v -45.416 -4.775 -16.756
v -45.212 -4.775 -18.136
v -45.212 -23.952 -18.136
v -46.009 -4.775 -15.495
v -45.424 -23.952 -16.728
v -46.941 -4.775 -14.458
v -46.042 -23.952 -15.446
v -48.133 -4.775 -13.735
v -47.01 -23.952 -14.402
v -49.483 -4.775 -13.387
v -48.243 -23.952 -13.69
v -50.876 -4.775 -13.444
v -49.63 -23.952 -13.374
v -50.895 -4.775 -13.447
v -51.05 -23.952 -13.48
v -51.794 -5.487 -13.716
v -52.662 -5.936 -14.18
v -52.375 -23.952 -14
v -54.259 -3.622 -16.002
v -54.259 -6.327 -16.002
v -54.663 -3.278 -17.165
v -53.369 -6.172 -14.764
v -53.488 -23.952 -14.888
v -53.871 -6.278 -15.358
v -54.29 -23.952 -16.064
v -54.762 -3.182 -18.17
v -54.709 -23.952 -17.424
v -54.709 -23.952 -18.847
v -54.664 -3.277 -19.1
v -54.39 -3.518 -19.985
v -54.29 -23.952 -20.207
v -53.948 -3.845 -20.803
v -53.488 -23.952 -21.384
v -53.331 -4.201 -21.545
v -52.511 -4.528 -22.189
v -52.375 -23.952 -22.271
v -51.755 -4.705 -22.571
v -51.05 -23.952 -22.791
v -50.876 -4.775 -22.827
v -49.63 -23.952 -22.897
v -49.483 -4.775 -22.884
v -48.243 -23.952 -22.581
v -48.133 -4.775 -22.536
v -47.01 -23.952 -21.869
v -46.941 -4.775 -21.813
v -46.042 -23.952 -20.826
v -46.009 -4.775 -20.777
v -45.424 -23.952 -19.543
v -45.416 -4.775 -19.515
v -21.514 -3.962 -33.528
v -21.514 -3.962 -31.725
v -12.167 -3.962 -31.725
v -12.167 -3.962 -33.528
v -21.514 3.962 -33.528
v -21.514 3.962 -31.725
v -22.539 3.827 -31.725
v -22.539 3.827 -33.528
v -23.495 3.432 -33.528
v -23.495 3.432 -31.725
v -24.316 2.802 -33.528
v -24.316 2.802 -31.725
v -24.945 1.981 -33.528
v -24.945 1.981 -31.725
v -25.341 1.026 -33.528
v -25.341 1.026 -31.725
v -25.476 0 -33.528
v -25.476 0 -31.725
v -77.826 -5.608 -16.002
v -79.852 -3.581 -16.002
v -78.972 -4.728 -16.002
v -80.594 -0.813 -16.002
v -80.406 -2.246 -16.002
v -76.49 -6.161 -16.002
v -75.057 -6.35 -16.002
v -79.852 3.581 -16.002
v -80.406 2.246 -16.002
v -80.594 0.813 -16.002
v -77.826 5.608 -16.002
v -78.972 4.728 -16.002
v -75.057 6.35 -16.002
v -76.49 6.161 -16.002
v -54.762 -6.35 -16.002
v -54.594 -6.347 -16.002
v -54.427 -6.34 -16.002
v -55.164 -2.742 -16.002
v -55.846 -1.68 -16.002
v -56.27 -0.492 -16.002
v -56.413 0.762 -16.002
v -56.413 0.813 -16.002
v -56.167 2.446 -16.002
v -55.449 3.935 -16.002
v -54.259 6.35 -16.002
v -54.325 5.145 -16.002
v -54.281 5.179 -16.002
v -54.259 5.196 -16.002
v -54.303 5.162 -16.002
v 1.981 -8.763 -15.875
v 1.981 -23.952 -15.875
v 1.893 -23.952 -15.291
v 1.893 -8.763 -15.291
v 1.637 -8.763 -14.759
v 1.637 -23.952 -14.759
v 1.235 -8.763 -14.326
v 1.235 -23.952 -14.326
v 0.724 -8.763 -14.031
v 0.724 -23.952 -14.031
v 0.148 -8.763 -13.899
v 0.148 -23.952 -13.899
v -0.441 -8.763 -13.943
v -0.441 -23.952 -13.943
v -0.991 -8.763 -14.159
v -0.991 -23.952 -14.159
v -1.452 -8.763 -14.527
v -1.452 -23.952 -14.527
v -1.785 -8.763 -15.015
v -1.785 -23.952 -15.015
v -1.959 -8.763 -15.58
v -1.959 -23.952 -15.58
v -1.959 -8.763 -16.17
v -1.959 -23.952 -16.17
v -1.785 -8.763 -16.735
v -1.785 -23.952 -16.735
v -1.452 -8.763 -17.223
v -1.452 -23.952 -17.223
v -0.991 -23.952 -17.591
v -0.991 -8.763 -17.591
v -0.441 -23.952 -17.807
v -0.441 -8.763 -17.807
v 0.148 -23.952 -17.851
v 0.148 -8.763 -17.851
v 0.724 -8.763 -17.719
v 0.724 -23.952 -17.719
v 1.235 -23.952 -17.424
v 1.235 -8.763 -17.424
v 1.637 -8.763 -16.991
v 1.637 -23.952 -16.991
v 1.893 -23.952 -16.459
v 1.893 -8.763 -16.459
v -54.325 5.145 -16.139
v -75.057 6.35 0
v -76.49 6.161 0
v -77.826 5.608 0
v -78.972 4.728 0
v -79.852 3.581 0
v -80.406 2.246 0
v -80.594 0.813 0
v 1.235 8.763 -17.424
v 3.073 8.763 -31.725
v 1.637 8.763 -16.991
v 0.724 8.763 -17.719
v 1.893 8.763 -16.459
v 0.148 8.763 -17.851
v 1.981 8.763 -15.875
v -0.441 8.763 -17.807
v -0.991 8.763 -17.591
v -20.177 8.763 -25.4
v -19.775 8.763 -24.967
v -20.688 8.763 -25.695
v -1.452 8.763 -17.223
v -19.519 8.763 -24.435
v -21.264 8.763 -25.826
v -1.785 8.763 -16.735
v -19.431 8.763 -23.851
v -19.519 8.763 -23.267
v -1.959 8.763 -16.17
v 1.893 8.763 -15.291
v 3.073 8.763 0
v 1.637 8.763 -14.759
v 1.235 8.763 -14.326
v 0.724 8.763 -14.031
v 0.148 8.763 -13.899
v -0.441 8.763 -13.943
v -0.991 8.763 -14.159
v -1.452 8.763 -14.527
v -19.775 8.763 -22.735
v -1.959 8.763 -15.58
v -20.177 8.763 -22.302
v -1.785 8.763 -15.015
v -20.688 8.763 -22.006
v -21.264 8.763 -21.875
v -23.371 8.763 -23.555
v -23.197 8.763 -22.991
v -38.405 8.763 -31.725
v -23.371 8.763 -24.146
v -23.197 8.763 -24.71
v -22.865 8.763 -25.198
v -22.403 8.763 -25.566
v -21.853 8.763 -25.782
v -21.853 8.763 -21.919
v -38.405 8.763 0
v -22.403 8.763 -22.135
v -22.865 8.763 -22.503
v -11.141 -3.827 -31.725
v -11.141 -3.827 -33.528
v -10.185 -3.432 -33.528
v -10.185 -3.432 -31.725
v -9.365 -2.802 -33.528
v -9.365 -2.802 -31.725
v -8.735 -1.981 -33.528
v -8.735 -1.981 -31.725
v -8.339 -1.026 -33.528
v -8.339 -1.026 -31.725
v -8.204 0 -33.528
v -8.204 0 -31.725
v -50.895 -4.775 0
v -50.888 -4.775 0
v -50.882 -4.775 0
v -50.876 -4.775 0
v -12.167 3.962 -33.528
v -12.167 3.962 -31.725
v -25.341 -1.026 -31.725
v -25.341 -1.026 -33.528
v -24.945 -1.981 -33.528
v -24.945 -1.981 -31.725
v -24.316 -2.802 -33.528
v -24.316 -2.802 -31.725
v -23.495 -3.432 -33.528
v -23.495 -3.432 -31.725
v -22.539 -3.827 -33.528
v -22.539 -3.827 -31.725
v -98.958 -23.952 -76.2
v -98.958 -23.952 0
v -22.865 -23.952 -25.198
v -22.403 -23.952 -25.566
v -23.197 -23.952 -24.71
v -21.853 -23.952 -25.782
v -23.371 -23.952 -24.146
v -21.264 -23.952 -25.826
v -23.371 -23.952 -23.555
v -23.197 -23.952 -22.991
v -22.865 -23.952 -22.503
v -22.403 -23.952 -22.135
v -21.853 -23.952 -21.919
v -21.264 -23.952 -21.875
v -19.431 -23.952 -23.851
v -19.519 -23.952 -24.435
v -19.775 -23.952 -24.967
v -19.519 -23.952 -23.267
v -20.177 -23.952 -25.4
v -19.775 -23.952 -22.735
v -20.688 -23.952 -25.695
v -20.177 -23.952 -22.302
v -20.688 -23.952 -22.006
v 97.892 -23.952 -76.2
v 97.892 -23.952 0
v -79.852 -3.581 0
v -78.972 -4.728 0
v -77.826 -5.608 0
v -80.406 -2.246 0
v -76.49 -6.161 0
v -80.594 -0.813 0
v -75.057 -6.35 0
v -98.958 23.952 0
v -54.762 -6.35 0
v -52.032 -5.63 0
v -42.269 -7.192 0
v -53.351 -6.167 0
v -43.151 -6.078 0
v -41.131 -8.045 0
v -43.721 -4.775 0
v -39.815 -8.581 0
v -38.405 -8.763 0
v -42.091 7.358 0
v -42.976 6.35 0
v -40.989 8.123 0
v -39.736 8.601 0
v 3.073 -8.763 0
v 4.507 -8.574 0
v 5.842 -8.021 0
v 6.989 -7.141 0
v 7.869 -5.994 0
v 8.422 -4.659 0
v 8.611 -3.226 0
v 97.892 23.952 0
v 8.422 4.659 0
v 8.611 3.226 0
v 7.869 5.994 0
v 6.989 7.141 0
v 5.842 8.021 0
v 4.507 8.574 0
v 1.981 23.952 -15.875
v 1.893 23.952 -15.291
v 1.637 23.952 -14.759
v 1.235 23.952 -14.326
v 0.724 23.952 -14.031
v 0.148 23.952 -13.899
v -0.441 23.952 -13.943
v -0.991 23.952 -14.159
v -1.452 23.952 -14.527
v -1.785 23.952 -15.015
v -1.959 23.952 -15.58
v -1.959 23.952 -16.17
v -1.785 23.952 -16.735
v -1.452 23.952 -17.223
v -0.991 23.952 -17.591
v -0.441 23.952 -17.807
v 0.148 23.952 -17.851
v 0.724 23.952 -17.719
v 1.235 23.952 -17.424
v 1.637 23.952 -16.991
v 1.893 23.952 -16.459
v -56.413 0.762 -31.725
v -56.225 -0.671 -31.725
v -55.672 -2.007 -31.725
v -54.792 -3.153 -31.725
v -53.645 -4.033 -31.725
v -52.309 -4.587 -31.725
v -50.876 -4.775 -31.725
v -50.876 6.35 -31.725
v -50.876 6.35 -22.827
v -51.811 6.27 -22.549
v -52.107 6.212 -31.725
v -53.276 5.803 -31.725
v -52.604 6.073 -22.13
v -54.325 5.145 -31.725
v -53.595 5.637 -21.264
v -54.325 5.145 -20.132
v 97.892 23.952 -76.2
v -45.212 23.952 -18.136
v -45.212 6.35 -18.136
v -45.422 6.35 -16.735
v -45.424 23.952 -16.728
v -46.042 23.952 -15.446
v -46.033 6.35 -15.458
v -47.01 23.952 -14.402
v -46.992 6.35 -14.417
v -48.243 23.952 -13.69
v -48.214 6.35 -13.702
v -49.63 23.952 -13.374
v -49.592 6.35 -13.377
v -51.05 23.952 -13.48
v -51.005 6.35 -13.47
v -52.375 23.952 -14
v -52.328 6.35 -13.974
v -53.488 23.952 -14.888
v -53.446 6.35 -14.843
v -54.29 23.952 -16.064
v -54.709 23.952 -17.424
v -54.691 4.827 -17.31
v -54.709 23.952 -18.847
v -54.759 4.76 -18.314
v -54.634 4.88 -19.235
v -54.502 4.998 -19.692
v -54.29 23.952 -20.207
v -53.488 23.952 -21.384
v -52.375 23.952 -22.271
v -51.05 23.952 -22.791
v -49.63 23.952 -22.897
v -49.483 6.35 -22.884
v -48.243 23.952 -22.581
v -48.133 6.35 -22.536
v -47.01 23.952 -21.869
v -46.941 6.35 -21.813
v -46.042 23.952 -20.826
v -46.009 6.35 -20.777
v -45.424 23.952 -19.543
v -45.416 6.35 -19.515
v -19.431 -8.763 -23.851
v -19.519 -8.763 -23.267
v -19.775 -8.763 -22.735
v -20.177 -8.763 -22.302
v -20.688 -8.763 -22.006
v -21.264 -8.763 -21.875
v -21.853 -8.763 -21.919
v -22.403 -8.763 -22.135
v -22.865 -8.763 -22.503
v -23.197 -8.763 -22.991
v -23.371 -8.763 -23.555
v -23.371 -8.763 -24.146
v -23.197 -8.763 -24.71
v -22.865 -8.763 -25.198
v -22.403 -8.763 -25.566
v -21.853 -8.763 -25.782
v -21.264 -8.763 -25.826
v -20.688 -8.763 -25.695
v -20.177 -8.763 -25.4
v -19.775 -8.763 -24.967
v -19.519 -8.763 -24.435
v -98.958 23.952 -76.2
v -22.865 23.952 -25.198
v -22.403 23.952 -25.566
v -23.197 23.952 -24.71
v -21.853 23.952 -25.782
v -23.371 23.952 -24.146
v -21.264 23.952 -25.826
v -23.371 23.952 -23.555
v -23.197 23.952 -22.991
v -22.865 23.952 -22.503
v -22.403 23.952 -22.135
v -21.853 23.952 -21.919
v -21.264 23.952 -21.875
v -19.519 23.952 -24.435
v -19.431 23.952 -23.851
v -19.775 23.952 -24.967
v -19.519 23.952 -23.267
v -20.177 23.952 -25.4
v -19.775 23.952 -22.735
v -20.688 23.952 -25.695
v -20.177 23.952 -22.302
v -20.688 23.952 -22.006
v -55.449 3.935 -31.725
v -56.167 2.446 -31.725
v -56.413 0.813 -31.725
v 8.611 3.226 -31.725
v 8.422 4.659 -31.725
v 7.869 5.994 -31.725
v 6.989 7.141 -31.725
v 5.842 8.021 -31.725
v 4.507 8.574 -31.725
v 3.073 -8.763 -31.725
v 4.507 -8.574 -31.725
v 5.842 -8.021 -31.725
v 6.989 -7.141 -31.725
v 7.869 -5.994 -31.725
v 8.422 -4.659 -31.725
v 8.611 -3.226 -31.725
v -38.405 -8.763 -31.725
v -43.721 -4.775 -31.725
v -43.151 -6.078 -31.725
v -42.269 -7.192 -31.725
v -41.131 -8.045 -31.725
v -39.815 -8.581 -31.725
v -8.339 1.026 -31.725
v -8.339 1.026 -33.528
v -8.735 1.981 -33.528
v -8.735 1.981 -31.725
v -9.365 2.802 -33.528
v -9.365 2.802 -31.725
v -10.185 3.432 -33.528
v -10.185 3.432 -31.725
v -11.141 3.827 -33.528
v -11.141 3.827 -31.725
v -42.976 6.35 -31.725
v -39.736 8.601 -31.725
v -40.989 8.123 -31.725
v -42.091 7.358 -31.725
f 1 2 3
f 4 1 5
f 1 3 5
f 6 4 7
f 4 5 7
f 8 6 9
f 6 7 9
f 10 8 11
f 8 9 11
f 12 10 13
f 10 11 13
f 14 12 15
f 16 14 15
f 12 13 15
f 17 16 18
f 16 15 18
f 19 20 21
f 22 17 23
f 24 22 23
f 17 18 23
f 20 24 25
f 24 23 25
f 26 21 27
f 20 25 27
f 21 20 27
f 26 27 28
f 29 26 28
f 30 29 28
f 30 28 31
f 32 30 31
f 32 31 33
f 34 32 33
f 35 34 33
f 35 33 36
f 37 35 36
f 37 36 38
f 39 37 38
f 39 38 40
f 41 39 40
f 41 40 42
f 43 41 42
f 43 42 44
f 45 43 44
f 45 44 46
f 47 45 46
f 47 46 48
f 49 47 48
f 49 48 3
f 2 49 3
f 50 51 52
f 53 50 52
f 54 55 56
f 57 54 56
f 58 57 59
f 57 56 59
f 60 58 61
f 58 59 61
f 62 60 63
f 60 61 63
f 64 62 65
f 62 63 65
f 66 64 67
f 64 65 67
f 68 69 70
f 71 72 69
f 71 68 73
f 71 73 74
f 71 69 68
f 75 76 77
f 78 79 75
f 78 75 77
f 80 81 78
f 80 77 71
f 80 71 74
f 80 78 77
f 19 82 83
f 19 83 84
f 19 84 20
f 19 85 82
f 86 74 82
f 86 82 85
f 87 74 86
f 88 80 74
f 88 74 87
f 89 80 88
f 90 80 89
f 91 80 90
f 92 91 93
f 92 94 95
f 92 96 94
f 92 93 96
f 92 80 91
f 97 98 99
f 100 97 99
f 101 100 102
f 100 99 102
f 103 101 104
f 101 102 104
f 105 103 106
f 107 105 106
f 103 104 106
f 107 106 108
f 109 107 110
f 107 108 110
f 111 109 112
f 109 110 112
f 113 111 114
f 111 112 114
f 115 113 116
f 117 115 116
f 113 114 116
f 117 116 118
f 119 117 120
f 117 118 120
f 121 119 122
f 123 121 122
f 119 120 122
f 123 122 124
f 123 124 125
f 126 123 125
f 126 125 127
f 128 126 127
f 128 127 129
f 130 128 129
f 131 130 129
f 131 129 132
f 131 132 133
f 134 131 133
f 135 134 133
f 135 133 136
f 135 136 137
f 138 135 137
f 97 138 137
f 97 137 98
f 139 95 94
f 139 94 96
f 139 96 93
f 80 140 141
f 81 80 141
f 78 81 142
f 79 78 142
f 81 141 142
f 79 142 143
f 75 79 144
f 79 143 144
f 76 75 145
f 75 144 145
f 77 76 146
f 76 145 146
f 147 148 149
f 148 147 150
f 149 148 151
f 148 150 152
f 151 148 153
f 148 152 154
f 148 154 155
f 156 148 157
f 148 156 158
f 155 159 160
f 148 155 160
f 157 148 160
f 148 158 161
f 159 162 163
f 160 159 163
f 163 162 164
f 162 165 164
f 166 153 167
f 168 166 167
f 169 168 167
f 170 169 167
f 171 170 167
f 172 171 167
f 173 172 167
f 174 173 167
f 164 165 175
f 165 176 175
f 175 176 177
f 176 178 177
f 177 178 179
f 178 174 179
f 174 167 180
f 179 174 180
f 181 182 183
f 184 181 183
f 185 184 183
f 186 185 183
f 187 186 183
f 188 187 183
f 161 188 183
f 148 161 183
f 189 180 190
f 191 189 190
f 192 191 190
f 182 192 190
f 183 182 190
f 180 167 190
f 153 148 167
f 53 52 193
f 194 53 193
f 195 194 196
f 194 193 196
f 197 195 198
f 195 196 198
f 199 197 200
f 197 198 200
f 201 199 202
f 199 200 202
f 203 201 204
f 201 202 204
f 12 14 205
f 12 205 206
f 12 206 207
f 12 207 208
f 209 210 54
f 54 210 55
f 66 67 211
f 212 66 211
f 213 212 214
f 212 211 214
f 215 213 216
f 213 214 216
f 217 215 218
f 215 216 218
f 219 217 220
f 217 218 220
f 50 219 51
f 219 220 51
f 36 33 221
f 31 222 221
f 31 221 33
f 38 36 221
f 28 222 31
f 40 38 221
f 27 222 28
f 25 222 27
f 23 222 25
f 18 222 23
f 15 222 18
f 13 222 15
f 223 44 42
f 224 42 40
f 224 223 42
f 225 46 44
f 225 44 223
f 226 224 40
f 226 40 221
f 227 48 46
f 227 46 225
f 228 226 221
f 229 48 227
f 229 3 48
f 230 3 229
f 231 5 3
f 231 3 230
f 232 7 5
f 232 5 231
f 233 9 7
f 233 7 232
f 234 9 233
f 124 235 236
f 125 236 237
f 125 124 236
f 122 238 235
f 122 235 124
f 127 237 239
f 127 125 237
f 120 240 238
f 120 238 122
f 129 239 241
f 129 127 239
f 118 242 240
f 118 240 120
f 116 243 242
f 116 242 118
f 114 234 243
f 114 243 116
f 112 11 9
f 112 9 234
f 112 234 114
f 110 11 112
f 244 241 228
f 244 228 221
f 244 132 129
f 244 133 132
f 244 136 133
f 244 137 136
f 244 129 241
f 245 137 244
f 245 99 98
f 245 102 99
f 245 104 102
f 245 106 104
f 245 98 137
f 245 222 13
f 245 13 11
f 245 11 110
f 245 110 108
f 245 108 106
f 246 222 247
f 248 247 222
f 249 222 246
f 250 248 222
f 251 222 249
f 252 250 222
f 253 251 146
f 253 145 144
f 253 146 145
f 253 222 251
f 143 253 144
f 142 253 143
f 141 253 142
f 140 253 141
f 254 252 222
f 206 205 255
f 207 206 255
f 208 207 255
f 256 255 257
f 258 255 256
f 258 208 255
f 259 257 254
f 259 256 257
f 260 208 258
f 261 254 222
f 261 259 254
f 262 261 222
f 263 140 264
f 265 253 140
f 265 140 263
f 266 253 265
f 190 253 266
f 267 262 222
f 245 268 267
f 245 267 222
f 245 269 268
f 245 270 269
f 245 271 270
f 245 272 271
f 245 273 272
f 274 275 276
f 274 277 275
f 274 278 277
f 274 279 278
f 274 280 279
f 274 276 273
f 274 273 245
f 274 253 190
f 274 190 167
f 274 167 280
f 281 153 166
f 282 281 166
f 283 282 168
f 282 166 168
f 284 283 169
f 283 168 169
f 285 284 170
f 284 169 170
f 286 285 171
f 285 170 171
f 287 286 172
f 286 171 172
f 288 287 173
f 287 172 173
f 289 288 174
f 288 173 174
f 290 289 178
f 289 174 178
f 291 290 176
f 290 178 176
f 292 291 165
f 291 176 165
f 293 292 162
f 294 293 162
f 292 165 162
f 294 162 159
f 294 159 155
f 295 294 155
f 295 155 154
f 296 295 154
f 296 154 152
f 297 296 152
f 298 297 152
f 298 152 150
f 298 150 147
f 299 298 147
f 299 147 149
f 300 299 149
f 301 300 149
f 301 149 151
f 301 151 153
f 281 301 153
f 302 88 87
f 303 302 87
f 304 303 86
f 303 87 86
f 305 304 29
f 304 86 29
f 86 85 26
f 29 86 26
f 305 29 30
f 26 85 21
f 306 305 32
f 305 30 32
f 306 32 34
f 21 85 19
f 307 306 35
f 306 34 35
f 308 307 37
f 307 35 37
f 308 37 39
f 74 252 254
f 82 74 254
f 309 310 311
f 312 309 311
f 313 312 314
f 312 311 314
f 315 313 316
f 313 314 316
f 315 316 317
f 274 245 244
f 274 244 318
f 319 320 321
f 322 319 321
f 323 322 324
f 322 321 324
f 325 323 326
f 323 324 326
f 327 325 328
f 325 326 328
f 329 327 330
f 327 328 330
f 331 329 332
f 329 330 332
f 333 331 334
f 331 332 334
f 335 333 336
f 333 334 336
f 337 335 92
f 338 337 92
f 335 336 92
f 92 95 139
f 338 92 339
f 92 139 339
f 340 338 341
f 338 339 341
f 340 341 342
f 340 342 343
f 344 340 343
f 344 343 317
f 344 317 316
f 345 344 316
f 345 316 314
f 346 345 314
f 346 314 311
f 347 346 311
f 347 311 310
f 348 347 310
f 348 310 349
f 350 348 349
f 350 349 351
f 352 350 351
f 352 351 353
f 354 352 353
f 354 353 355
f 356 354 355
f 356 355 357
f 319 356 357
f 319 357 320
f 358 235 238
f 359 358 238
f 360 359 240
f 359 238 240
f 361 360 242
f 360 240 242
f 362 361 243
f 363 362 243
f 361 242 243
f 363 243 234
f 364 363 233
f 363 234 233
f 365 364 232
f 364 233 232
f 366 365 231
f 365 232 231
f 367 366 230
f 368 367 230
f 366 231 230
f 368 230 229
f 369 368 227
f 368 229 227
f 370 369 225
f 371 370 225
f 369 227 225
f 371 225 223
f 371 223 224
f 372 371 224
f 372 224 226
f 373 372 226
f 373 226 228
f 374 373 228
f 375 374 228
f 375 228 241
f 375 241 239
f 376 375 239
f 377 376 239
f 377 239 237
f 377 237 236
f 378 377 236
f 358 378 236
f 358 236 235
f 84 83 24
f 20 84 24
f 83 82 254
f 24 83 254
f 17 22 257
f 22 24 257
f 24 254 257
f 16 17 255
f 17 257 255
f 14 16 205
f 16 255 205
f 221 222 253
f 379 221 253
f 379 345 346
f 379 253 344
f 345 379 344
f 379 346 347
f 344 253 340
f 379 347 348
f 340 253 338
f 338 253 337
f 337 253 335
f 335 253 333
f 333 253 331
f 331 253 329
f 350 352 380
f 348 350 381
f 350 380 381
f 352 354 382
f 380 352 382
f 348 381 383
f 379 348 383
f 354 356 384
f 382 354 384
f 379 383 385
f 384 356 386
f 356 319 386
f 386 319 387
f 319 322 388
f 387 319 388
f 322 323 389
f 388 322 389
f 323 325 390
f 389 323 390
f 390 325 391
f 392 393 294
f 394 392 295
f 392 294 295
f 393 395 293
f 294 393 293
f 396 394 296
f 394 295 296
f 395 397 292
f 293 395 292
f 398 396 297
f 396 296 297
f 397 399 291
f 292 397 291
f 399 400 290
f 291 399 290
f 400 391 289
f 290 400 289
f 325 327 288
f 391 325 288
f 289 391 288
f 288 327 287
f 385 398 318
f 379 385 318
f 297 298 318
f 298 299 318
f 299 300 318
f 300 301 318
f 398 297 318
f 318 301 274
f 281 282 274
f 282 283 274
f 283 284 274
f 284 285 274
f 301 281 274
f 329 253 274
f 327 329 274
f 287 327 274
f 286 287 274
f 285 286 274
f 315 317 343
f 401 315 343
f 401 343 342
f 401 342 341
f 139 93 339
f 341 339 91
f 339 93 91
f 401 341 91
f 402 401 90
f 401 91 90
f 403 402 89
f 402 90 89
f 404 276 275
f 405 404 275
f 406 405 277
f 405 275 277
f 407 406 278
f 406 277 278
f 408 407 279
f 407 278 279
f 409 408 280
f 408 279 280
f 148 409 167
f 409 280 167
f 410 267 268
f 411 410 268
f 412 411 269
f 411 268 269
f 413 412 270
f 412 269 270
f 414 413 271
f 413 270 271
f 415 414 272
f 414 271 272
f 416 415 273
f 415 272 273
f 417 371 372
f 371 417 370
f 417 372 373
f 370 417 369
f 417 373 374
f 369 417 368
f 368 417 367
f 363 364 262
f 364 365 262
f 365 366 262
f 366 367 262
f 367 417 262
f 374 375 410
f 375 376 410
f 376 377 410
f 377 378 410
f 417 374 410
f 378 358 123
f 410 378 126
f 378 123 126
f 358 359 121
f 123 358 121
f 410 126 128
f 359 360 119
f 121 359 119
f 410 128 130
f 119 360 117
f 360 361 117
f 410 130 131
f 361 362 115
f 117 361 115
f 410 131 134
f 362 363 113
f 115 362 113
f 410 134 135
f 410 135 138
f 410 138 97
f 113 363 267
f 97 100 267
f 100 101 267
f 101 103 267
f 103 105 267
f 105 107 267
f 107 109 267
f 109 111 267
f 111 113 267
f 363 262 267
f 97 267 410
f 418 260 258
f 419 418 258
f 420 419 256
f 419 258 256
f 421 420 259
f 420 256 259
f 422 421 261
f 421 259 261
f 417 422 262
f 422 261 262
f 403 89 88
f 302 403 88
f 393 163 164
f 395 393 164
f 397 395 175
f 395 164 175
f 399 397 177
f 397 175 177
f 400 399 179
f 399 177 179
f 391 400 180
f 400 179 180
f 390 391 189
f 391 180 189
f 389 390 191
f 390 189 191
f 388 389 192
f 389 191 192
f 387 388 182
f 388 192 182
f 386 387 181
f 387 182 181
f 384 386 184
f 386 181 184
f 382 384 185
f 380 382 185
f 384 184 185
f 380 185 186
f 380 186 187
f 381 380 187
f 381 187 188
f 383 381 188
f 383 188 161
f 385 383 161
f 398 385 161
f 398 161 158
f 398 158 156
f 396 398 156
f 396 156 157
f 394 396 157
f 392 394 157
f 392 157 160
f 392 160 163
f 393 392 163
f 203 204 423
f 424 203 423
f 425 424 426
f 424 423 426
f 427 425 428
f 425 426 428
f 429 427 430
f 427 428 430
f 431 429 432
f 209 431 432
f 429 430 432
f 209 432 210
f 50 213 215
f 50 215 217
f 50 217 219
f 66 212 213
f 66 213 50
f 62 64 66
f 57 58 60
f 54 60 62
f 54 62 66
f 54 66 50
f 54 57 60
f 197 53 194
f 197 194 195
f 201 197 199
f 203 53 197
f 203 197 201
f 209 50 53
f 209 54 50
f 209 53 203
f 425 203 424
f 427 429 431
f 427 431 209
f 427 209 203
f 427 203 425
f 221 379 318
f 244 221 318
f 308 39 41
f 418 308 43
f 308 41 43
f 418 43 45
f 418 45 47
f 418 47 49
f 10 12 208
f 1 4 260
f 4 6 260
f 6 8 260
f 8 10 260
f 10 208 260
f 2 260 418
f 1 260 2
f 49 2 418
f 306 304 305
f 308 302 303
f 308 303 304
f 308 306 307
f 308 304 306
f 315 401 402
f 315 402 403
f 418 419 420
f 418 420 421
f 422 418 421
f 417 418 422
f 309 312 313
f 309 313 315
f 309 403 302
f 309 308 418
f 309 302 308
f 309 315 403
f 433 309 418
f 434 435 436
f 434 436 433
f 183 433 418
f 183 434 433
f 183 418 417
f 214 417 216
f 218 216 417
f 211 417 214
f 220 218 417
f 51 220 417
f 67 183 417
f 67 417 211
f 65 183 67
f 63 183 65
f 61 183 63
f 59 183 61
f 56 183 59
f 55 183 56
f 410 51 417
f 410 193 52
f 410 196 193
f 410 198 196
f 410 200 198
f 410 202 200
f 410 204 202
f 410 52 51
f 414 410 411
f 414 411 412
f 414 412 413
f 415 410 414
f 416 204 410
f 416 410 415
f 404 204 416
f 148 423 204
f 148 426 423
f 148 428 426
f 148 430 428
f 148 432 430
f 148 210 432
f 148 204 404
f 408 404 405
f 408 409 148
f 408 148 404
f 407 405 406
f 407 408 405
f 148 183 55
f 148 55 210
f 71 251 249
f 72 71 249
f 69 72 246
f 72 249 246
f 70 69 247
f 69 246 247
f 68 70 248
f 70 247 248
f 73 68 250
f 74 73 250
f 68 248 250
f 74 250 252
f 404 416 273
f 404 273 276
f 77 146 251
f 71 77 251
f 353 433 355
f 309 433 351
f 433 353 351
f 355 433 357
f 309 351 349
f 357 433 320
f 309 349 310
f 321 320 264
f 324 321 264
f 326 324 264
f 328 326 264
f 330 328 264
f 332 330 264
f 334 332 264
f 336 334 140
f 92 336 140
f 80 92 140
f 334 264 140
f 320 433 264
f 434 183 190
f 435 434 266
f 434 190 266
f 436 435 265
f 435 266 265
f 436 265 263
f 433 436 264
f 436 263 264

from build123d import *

# Parameters (mm, degrees)
F0_W     = 196.85
F0_H     = 47.9044
F1_DEPTH = 76.2
F2_R     = 4.7752
F2_R_2   = 1.9812
F3_DEPTH = 47.9054
F5_DEPTH = 31.7246
F7_DEPTH = 16.002
F9_DEPTH = 33.528


with BuildPart() as f1:
    # F0 (on Top) → F1 (new body)
    with BuildSketch(Plane.XY):
        with Locations((-0.5334, 0)):
            Rectangle(F0_W, F0_H)
    extrude(amount=-F1_DEPTH)

    # F2 (on face) → F3 (cut, through all)
    with BuildSketch(Plane.XZ.offset(23.9522)):
        with Locations((-49.9872, -18.1356)):
            Circle(F2_R)
        with Locations((-21.4122, -23.8506)):
            Circle(F2_R_2)
        with Locations((0, -15.875)):
            Circle(F2_R_2)
    extrude(amount=-F3_DEPTH, mode=Mode.SUBTRACT)

    # F4 (on face) → F5 (cut)
    with BuildSketch(Plane.XY):
        with BuildLine():
            ThreePointArc((8.6106, 3.2258), (6.988792, 7.141192), (3.0734, 8.763))
            Line((3.0734, 8.763), (-38.4048, 8.763))
            ThreePointArc((-38.4048, 8.763), (-40.989492, 8.122733), (-42.976447, 6.35))
            Line((-42.976447, 6.35), (-50.8762, 6.35))
            ThreePointArc((-50.8762, 6.35), (-52.702781, 6.040054), (-54.324875, 5.144915))
            ThreePointArc((-54.324875, 5.144915), (-55.864015, 3.217439), (-56.4134, 0.8128))
            Line((-56.4134, 0.8128), (-56.4134, 0.762))
            ThreePointArc((-56.4134, 0.762), (-54.791592, -3.153392), (-50.8762, -4.7752))
            Line((-50.8762, -4.7752), (-43.720808, -4.7752))
            ThreePointArc((-43.720808, -4.7752), (-41.727543, -7.655242), (-38.4048, -8.763))
            Line((-38.4048, -8.763), (3.0734, -8.763))
            ThreePointArc((3.0734, -8.763), (6.988792, -7.141192), (8.6106, -3.2258))
            Line((8.6106, -3.2258), (8.6106, 3.2258))
        make_face()
    extrude(amount=-F5_DEPTH, mode=Mode.SUBTRACT)

    # F6 (on face) → F7 (cut)
    with BuildSketch(Plane.XY):
        with BuildLine():
            Line((-49.2252, 6.35), (-75.057, 6.35))
            ThreePointArc((-75.057, 6.35), (-78.972392, 4.728192), (-80.5942, 0.8128))
            Line((-80.5942, 0.8128), (-80.5942, -0.8128))
            ThreePointArc((-80.5942, -0.8128), (-78.972392, -4.728192), (-75.057, -6.35))
            Line((-75.057, -6.35), (-54.7624, -6.35))
            ThreePointArc((-54.7624, -6.35), (-50.847008, -4.728192), (-49.2252, -0.8128))
            Line((-49.2252, -0.8128), (-49.2252, 6.35))
        make_face()
    extrude(amount=-F7_DEPTH, mode=Mode.SUBTRACT)

    # F8 (on face) → F9 (cut)
    with BuildSketch(Plane.XY):
        with BuildLine():
            Line((-12.1666, 3.9624), (-21.5138, 3.9624))
            ThreePointArc((-21.5138, 3.9624), (-24.31564, 2.80184), (-25.4762, 0))
            ThreePointArc((-25.4762, 0), (-24.31564, -2.80184), (-21.5138, -3.9624))
            Line((-21.5138, -3.9624), (-12.1666, -3.9624))
            ThreePointArc((-12.1666, -3.9624), (-9.36476, -2.80184), (-8.2042, 0))
            ThreePointArc((-8.2042, 0), (-9.36476, 2.80184), (-12.1666, 3.9624))
        make_face()
    extrude(amount=-F9_DEPTH, mode=Mode.SUBTRACT)


solid = f1.part
